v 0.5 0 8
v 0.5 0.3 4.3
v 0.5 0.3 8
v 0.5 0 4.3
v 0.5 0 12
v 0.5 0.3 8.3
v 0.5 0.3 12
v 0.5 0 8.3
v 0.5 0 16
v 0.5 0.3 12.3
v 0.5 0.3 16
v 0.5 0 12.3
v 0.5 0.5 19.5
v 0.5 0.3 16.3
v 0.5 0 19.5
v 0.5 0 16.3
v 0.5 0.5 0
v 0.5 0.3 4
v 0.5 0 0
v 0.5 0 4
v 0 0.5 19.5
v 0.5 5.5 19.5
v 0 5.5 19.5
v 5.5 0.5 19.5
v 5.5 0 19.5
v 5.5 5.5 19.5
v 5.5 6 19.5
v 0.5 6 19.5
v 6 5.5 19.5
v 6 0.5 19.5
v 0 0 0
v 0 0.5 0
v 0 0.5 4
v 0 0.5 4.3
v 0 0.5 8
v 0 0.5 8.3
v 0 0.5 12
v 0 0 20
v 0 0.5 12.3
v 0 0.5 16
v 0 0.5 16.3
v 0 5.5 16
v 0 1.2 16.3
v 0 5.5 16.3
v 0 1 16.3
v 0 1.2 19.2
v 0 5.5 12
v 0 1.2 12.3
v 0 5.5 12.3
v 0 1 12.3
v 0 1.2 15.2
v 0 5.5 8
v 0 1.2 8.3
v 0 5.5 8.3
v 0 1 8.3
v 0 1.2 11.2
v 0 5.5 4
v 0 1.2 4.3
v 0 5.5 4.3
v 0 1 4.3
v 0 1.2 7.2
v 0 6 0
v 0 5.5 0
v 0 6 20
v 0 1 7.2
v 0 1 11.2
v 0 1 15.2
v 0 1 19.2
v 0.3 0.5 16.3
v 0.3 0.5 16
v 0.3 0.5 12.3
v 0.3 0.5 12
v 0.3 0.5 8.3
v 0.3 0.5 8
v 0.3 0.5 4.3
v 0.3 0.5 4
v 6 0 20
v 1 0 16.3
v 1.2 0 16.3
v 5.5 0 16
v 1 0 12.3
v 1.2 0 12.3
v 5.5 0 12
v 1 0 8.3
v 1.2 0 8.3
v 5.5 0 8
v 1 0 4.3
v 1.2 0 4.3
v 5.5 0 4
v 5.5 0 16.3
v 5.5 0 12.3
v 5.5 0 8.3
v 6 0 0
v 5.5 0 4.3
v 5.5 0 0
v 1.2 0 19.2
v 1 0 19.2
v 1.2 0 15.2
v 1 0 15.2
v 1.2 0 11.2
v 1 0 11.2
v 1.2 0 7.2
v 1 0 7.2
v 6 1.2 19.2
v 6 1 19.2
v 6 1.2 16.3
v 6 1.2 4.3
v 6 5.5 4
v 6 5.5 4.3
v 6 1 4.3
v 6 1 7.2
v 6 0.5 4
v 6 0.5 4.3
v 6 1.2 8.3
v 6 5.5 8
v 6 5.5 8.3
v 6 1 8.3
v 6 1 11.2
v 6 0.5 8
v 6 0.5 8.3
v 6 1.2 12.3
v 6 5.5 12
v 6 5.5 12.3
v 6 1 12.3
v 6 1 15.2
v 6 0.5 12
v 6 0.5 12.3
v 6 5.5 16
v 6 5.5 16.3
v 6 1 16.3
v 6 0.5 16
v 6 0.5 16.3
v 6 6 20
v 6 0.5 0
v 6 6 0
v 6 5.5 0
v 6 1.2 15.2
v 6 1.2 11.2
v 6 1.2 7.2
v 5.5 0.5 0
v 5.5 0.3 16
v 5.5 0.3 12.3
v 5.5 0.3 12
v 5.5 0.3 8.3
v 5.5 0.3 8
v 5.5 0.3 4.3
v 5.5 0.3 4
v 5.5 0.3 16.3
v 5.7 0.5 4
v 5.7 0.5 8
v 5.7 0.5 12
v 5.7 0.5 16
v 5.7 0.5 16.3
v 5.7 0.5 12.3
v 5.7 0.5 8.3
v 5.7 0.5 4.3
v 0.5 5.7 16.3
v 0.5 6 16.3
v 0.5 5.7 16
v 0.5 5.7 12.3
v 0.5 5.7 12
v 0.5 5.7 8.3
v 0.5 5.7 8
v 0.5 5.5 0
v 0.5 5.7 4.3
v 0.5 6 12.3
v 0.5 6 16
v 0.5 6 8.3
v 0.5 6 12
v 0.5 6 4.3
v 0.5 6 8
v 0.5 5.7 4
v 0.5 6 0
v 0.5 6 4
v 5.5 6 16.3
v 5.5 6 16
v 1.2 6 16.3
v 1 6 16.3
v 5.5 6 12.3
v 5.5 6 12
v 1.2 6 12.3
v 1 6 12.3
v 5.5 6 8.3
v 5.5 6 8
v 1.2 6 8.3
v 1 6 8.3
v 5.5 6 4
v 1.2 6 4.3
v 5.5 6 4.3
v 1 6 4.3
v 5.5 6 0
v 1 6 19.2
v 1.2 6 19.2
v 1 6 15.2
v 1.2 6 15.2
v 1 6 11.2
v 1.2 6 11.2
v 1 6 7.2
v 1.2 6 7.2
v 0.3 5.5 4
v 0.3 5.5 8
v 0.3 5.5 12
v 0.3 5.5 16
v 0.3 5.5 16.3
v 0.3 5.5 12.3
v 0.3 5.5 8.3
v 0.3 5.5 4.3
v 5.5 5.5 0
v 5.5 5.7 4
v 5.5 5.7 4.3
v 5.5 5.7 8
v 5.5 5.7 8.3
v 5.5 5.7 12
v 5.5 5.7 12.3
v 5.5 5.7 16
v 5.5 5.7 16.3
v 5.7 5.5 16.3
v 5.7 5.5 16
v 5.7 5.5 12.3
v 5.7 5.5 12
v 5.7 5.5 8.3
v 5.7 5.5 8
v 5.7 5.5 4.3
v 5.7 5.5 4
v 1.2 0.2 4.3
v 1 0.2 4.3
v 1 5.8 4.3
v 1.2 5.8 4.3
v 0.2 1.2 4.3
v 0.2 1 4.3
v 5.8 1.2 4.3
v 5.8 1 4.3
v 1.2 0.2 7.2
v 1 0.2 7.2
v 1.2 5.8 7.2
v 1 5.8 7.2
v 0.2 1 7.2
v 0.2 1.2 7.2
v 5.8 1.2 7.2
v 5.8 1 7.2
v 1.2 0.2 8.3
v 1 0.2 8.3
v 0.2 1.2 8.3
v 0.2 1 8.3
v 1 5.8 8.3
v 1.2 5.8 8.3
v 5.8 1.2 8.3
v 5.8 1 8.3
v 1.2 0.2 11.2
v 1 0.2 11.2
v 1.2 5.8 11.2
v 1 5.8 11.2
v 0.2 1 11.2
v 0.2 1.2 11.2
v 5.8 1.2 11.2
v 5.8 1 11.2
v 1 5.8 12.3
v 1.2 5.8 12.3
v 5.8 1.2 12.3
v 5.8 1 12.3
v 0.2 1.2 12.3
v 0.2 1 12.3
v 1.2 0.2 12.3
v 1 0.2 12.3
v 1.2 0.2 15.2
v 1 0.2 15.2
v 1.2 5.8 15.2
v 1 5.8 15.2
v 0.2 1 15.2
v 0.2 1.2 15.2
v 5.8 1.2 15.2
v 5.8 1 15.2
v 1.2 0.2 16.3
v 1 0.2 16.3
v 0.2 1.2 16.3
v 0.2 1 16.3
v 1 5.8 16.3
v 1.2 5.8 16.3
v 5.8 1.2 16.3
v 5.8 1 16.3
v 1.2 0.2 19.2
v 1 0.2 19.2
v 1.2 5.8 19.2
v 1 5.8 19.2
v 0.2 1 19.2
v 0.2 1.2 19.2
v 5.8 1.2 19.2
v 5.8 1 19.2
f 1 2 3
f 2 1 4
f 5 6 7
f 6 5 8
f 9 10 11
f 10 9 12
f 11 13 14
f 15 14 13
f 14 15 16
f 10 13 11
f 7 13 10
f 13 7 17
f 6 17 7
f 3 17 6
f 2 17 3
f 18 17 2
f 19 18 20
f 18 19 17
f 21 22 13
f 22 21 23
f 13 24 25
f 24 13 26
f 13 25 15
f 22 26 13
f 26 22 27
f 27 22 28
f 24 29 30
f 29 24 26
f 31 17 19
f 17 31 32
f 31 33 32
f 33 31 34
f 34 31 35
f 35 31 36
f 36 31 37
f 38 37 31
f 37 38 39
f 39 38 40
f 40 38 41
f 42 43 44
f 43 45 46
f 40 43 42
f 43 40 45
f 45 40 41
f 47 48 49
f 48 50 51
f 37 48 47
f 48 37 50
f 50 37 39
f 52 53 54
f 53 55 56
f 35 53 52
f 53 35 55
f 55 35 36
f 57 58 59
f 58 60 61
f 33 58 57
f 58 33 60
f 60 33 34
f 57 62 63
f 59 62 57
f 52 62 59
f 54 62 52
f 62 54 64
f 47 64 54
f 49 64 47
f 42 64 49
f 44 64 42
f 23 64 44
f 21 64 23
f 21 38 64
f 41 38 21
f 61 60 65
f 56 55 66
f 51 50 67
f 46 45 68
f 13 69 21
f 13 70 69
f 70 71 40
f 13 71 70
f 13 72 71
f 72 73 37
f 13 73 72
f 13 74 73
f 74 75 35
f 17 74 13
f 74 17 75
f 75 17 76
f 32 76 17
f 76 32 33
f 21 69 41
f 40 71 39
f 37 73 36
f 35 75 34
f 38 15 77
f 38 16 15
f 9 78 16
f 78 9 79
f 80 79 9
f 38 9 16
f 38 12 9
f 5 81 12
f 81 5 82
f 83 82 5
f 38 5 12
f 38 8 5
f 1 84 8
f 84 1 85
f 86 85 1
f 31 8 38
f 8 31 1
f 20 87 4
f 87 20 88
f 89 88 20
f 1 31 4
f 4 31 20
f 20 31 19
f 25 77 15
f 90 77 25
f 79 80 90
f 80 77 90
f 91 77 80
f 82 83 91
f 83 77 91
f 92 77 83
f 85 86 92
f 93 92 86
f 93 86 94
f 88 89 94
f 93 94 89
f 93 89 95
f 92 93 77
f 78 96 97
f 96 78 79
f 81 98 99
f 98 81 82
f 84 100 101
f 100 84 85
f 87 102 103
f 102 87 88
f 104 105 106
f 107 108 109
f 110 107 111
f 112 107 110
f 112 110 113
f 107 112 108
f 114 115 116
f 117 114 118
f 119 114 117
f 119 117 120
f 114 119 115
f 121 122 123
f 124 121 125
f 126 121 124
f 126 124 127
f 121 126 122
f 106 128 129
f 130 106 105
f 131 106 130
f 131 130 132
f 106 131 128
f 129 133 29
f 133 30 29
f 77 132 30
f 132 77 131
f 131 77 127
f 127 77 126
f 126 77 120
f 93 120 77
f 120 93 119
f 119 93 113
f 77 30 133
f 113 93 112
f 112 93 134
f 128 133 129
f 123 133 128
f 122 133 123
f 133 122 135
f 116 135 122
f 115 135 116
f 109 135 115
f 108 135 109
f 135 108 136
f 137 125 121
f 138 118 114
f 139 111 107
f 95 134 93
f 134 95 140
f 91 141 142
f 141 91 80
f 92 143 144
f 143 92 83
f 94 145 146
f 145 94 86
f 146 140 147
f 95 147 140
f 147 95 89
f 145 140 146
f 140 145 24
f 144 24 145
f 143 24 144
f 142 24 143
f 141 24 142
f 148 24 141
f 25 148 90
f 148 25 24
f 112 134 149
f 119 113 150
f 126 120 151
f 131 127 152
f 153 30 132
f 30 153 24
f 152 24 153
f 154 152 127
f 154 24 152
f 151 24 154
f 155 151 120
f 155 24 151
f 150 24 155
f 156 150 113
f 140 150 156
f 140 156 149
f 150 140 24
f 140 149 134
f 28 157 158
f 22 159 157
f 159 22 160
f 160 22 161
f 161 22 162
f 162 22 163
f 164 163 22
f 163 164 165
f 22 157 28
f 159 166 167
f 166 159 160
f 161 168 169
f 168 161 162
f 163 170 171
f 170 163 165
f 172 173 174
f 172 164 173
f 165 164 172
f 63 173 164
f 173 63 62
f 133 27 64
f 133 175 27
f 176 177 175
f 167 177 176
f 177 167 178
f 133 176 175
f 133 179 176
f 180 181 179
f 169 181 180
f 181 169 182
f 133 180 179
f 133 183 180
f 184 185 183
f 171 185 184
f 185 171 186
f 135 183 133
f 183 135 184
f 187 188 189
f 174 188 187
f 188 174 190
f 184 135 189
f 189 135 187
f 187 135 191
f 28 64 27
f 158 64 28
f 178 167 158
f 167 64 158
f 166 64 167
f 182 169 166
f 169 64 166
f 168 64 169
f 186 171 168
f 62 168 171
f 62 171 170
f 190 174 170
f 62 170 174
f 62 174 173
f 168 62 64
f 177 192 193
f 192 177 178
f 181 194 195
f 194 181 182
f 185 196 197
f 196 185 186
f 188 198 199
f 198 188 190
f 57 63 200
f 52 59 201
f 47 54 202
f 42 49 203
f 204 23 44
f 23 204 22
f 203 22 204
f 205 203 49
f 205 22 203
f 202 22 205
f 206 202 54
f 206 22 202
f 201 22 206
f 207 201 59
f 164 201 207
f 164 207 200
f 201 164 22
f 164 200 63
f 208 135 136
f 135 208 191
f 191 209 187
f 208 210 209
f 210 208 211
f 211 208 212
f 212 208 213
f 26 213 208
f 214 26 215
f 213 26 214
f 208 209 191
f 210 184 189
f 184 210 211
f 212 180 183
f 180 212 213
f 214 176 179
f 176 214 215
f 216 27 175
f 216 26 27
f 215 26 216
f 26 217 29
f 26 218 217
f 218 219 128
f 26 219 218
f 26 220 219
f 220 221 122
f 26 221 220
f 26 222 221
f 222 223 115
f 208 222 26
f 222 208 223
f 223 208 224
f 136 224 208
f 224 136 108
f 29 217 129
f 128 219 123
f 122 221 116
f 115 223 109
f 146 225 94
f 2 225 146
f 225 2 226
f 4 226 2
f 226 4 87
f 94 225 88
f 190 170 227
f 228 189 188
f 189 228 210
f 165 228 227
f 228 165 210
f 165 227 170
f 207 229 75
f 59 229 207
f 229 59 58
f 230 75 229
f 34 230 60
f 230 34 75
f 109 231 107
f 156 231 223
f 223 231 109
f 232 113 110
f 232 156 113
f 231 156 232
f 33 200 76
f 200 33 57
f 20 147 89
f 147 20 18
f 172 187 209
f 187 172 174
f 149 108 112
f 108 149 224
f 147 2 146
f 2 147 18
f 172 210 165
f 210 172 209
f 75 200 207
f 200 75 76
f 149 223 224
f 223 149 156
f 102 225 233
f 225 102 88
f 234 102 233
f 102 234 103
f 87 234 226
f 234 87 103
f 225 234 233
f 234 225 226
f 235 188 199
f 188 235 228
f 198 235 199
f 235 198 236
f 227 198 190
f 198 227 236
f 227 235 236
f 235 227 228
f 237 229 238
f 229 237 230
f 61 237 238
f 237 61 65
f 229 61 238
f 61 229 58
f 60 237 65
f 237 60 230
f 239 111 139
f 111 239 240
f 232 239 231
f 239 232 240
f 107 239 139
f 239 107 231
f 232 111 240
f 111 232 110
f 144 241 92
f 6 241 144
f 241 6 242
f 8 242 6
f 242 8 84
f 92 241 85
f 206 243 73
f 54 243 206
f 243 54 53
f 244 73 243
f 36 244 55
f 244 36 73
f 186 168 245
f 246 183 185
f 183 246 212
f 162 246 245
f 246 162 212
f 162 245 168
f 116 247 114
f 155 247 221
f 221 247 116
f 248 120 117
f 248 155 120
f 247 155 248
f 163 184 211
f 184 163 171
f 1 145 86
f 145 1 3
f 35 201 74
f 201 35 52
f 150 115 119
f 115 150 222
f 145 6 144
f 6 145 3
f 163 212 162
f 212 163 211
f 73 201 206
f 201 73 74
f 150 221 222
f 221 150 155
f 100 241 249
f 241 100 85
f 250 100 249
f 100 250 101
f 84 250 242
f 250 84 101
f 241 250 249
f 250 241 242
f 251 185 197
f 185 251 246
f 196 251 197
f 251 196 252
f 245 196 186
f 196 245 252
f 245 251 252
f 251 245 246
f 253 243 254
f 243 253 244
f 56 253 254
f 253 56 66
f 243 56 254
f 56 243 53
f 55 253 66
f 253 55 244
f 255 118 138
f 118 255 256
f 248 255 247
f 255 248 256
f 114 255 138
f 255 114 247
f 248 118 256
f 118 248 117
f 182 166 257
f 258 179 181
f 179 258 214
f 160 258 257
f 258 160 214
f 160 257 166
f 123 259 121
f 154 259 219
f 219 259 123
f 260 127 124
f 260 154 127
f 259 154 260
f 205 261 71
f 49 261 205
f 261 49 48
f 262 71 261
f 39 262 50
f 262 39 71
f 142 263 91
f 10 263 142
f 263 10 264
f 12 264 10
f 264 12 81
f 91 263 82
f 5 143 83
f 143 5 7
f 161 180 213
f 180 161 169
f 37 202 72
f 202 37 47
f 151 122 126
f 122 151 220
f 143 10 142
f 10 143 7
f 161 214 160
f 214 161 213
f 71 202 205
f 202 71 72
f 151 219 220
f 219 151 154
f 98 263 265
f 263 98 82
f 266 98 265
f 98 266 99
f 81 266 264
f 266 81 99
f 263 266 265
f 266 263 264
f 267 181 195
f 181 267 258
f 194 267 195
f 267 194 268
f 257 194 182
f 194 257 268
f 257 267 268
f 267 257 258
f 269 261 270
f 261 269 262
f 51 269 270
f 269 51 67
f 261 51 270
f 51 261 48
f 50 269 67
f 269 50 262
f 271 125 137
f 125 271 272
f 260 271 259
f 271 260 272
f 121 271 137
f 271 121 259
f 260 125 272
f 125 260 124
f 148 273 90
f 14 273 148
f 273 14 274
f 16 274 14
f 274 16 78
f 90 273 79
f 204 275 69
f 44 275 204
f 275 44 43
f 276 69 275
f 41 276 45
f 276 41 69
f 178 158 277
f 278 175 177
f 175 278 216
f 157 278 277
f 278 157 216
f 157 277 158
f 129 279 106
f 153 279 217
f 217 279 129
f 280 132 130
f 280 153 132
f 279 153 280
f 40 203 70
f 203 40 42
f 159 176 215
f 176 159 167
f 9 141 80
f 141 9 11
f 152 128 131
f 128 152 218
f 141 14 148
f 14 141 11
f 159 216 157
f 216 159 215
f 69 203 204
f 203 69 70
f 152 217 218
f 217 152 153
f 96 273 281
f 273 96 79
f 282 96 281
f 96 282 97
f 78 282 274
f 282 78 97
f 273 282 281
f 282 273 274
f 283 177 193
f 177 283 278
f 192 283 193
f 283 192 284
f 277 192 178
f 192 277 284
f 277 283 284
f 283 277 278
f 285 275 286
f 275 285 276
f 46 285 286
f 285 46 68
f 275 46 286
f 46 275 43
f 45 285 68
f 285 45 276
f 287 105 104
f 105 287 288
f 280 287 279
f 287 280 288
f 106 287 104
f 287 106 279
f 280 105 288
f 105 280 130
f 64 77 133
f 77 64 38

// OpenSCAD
// 桁架天线塔 (battle_mast) — 荒漠通讯/观察制高点
// 轴: x=宽(6), y=深(6), z=高(20); 原点在角(0,0,0)
// 四主柱(0.5²×19.5) + 每 4m 横撑(4 层) + 顶部平台(0.5) → z 顶=20
// 柱间可通行, 平台可攀(制高点)
// 碰撞契约: 四柱 0.5²×20 + 顶部平台 → GLB bbox 必须精确 6×6×20
$fn = 6;

module columns() {
  // 四主柱 (截面 0.5, 高 19.5; 顶部 0.5 由平台补齐 → z 20)
  for (y = [0, 5.5]) for (x = [0, 5.5]) {
    color([0.45, 0.40, 0.36]) translate([x, y, 0]) cube([0.5, 0.5, 19.5]);
  }
}

module braces() {
  // 每 4m 一层横撑 (4 层: z 4/8/12/16, 厚 0.3)
  for (z = [4, 8, 12, 16]) {
    color([0.42, 0.37, 0.33]) translate([0, 0, z]) cube([6, 0.3, 0.3]);
    color([0.42, 0.37, 0.33]) translate([0, 5.7, z]) cube([6, 0.3, 0.3]);
    color([0.42, 0.37, 0.33]) translate([0, 0, z]) cube([0.3, 6, 0.3]);
    color([0.42, 0.37, 0.33]) translate([5.7, 0, z]) cube([0.3, 6, 0.3]);
    // 每层交叉斜撑 (对角 2 根, 细条)
    color([0.40, 0.35, 0.31]) translate([1, 0, z]) cube([0.2, 0.2, 3.2]);
    color([0.40, 0.35, 0.31]) translate([1, 5.8, z]) cube([0.2, 0.2, 3.2]);
    color([0.40, 0.35, 0.31]) translate([0, 1, z]) cube([0.2, 0.2, 3.2]);
    color([0.40, 0.35, 0.31]) translate([5.8, 1, z]) cube([0.2, 0.2, 3.2]);
  }
}

module platform() {
  // 顶部平台 (6×6×0.5, z 19.5-20)
  color([0.50, 0.46, 0.40]) translate([0, 0, 19.5]) cube([6, 6, 0.5]);
}

columns();
braces();
platform();
